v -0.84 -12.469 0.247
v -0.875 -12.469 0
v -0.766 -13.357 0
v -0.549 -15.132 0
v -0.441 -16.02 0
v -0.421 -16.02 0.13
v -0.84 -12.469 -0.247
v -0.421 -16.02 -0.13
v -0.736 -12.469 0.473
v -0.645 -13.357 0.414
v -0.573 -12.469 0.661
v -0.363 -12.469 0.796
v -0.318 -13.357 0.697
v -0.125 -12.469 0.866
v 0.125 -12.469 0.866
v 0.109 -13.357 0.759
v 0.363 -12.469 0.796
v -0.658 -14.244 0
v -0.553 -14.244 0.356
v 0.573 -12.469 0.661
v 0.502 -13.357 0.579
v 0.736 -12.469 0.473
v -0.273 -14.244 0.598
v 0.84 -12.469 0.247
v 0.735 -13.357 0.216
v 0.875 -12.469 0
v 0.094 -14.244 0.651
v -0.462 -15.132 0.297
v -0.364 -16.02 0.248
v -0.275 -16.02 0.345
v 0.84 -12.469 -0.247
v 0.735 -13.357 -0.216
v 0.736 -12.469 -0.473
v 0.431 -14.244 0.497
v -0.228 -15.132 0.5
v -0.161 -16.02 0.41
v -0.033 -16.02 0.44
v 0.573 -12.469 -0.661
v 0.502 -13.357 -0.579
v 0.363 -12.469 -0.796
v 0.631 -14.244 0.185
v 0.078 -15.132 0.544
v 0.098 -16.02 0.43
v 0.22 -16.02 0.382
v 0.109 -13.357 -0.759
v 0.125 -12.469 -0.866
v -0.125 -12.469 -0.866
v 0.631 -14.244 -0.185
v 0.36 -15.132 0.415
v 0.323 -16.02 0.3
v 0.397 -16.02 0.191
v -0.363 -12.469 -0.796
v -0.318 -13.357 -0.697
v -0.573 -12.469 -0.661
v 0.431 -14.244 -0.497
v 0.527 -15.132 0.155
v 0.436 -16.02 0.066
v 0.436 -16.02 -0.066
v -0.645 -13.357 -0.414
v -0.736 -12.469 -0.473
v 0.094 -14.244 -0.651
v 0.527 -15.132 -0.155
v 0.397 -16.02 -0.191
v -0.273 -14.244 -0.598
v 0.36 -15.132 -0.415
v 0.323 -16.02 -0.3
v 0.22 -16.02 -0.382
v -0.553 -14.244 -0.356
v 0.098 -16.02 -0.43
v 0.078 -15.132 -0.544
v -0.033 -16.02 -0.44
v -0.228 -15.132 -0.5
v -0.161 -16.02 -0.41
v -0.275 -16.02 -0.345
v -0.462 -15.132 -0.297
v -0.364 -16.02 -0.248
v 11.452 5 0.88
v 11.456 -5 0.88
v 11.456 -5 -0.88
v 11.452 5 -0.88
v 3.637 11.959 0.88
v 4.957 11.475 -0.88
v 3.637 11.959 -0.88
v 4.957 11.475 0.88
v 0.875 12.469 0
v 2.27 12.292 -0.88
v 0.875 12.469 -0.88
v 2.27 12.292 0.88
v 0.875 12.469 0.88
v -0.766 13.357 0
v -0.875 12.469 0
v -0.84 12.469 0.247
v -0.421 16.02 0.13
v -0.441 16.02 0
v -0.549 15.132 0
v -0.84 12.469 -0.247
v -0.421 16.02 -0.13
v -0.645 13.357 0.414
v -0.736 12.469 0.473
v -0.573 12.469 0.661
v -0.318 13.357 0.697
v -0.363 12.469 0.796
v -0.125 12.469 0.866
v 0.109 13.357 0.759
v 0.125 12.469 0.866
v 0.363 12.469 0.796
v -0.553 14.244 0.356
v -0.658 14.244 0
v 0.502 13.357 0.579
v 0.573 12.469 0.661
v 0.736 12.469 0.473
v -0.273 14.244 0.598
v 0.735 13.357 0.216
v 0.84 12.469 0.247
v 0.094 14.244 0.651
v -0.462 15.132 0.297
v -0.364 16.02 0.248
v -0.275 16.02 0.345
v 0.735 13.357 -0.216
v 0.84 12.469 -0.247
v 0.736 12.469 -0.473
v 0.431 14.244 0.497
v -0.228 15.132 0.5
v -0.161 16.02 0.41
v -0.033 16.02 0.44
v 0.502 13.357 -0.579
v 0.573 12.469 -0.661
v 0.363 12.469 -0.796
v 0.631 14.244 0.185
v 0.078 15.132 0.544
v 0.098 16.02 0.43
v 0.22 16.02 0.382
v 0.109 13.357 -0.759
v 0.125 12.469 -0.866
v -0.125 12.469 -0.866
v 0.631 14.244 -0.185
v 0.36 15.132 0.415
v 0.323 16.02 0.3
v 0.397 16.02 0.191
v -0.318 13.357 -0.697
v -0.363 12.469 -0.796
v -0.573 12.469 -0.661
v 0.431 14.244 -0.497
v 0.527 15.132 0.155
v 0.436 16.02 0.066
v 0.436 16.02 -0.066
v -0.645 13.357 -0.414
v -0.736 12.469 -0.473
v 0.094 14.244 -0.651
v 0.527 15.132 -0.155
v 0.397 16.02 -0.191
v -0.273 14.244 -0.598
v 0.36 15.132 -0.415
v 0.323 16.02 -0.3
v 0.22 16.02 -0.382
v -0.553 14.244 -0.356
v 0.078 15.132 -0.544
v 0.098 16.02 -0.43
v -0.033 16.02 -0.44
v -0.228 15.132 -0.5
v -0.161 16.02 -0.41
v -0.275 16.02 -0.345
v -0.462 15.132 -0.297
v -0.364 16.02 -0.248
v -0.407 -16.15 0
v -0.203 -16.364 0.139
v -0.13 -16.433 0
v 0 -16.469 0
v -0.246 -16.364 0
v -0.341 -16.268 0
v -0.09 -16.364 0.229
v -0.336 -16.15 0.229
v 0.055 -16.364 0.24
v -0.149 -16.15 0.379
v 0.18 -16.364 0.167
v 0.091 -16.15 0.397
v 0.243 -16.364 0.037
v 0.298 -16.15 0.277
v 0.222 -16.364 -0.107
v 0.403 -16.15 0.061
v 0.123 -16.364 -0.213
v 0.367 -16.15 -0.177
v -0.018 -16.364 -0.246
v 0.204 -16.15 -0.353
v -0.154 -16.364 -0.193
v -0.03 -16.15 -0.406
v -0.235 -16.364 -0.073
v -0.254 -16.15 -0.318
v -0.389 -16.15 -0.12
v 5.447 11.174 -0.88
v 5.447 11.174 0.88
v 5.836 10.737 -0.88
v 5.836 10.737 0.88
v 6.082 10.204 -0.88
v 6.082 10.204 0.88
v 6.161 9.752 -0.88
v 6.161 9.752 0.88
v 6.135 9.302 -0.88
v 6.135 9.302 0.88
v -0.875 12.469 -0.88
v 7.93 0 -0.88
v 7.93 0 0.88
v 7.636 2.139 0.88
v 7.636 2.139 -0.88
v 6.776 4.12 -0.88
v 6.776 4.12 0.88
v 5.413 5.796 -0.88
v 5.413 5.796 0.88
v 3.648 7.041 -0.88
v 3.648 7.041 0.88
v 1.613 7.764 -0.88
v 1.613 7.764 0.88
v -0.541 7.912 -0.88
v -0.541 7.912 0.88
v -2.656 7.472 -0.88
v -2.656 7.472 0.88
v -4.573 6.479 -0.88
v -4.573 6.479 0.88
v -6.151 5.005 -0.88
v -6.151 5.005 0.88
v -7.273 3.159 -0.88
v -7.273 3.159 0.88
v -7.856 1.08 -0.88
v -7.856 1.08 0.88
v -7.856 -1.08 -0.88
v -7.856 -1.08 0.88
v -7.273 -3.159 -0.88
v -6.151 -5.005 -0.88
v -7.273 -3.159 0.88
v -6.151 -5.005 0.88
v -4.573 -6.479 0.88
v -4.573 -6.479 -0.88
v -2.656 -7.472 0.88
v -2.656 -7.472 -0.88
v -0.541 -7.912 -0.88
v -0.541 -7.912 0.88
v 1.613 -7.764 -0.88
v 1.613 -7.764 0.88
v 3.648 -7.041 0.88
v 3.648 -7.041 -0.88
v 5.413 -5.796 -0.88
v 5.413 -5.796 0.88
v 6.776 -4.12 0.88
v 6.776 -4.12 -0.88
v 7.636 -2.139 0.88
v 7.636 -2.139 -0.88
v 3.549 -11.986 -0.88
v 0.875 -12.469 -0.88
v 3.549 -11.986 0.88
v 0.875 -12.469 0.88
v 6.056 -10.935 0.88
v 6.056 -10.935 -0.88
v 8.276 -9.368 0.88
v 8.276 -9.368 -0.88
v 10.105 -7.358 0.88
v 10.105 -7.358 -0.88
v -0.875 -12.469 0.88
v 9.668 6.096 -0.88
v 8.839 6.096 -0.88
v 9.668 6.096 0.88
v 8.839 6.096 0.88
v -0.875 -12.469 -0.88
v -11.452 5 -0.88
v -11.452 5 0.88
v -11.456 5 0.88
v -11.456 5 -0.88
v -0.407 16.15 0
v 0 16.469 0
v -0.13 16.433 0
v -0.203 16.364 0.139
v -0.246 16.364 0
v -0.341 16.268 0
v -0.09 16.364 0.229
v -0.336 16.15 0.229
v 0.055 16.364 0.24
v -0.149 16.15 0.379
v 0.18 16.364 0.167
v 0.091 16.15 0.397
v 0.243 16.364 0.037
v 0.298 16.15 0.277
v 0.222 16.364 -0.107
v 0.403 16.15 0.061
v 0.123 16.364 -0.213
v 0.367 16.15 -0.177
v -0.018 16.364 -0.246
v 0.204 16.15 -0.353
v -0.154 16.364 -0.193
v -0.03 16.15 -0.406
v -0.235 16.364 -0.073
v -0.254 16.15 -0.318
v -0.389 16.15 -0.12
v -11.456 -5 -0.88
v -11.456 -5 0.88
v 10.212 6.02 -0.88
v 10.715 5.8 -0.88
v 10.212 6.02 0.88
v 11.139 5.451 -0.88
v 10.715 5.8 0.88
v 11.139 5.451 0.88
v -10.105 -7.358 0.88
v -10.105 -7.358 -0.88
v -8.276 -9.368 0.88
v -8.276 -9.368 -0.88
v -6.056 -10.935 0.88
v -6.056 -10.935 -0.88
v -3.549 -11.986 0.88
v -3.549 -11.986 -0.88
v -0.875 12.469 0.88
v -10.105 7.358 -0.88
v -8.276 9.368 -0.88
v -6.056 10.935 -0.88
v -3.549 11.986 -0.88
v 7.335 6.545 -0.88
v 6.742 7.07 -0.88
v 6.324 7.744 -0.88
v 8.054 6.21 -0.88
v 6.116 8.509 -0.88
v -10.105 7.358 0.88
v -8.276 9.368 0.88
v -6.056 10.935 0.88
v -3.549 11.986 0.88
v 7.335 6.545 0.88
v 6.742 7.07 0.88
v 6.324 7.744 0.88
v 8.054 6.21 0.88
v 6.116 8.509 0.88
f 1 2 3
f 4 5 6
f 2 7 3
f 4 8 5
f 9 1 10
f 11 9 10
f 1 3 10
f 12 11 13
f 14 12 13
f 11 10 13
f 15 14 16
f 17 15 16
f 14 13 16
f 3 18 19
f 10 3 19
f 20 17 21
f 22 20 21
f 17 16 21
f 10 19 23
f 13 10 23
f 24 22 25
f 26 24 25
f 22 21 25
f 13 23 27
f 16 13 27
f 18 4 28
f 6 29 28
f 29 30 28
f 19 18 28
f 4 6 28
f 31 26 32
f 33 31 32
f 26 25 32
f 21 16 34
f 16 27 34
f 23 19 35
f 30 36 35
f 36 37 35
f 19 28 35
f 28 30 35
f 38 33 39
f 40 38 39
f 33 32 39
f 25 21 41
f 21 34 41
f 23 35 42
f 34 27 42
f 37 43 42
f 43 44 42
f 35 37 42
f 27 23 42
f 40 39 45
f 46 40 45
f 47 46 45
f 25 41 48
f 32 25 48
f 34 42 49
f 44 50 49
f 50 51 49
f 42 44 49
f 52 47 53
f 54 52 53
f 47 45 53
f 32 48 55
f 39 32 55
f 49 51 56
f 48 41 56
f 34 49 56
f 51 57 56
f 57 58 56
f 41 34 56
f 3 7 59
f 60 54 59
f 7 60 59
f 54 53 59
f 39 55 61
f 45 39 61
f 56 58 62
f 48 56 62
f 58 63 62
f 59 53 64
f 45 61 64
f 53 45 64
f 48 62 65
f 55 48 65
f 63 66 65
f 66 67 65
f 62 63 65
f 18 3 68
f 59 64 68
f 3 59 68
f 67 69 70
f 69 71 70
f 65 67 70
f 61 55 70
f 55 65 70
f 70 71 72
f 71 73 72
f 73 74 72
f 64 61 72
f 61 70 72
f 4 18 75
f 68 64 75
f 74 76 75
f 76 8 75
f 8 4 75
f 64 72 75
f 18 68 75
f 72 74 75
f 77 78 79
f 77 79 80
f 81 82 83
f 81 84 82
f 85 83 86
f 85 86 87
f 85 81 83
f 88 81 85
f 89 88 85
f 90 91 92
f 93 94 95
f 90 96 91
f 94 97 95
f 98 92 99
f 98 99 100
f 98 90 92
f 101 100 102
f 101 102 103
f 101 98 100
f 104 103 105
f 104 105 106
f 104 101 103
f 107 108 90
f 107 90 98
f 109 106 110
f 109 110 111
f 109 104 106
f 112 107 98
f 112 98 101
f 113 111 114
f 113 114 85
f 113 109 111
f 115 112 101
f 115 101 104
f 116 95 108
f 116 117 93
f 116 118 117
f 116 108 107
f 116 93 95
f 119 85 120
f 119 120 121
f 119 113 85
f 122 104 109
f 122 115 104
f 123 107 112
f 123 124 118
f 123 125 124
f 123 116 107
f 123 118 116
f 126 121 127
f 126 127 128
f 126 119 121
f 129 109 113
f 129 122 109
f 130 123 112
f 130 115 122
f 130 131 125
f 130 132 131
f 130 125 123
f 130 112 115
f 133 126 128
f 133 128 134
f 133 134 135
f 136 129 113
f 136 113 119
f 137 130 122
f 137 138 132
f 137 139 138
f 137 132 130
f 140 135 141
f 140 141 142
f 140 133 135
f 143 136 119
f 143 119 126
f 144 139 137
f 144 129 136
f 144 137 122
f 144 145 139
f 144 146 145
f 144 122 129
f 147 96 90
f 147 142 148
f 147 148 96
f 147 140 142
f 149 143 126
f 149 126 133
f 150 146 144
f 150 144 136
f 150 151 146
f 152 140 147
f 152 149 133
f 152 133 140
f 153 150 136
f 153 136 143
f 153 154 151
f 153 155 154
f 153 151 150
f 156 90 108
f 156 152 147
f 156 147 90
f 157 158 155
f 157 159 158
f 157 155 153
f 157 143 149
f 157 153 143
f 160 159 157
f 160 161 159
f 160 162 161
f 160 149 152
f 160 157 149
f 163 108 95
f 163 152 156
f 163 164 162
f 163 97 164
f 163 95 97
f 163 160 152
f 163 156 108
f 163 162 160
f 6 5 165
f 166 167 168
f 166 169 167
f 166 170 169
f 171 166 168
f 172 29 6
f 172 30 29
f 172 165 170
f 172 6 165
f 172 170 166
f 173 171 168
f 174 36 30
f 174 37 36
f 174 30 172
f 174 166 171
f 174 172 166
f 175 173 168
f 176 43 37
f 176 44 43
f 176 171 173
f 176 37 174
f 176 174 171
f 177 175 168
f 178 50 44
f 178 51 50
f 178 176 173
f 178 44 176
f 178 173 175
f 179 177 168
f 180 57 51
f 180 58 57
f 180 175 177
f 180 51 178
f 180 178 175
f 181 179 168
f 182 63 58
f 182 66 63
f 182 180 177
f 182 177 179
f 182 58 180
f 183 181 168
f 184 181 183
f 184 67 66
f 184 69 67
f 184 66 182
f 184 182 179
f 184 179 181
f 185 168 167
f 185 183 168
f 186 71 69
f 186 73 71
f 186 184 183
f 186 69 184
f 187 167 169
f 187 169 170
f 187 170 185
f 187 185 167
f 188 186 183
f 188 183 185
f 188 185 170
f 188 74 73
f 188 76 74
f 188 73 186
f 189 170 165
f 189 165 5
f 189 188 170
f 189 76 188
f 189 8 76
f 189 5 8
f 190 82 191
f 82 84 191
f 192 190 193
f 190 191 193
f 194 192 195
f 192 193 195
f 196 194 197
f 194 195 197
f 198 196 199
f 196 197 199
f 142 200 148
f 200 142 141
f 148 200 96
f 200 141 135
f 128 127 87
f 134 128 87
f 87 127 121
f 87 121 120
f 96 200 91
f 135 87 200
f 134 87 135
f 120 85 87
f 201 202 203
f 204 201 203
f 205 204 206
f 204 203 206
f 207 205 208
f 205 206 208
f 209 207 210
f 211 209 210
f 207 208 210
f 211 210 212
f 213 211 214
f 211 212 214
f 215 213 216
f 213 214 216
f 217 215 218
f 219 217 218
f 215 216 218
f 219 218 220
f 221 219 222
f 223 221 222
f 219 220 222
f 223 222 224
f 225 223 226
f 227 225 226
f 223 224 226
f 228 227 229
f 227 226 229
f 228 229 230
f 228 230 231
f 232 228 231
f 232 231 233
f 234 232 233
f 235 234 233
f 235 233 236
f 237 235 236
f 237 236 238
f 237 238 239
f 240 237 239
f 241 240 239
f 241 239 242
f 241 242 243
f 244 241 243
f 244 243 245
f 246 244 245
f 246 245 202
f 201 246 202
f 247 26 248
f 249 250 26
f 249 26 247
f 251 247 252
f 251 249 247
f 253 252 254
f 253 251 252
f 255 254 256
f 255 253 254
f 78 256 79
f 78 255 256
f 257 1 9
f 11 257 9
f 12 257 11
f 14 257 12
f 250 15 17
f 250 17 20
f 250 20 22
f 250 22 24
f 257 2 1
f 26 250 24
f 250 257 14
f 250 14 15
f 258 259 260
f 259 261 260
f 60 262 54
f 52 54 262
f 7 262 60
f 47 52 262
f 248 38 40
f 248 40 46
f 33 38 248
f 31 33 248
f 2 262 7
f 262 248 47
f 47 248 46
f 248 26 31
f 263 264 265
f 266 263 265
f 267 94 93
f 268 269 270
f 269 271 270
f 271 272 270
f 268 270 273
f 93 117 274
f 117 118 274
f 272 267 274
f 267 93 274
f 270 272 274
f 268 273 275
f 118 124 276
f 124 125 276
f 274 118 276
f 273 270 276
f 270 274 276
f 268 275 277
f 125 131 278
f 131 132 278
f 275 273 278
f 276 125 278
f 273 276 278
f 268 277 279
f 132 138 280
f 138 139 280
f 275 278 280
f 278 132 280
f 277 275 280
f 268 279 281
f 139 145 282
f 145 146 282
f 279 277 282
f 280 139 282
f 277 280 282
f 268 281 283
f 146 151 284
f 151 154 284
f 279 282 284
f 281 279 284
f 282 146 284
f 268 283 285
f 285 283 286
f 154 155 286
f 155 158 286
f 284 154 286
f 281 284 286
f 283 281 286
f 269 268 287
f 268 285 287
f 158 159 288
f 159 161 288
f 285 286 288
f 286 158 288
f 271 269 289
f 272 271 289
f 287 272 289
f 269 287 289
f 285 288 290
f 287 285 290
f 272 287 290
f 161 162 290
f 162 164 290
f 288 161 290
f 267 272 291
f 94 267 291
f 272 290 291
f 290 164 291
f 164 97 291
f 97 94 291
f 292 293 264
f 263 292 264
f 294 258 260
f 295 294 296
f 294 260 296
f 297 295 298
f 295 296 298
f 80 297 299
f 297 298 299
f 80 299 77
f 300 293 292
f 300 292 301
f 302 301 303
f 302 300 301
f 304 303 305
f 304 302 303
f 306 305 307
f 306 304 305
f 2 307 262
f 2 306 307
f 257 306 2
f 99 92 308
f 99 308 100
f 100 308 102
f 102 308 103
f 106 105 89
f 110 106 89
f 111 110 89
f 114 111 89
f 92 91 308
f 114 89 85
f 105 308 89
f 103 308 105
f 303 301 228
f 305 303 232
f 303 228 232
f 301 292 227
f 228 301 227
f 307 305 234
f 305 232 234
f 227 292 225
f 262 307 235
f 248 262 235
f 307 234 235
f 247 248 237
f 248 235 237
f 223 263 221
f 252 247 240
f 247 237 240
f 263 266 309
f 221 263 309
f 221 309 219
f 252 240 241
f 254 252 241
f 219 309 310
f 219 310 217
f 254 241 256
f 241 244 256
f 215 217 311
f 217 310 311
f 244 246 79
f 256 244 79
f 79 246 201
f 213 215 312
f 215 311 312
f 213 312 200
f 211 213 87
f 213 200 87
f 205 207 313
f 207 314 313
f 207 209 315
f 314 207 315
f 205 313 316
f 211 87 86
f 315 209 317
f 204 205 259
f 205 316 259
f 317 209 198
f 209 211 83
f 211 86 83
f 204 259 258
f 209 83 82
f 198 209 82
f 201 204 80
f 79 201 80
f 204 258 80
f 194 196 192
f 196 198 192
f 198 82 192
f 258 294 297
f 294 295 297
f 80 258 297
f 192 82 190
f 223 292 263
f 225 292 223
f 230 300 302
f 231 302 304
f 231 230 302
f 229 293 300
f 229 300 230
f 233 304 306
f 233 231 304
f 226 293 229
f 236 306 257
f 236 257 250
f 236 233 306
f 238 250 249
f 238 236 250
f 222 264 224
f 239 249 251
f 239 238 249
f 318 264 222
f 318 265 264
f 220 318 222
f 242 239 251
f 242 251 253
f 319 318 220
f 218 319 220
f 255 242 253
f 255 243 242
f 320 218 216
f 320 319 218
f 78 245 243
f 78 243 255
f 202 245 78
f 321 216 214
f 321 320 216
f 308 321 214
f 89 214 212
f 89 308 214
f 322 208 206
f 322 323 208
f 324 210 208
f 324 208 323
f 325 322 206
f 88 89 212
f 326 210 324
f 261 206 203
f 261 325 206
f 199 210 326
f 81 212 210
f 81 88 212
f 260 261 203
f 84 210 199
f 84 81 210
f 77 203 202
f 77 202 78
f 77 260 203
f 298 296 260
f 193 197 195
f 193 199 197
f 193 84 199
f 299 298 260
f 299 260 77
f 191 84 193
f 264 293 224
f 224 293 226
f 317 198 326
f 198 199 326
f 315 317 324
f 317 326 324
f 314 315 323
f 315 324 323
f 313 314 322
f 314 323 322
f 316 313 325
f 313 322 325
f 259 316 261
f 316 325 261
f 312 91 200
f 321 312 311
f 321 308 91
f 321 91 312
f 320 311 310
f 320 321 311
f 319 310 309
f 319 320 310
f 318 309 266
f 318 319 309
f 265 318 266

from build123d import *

# Parameters (mm, degrees)
PAD_DEPTH       = 0.88
PAD_DEPTH_BACK  = 0.88
FILLET_R        = 2
SKETCH002_R     = 7.93
POCKET_DEPTH    = 5
POCKET001_DEPTH = 5


with BuildPart() as part:
    # Sketch → Pad (new body, two sides)
    with BuildSketch(Plane.XY) as pad_sk:
        with BuildLine():
            ThreePointArc((-0.875, 12.469337), (-12.5, 0), (-0.875, -12.469337))
            Line((-0.875, -12.469337), (-0.875, -16.469337))
            Line((-0.875, -16.469337), (0.875, -16.469337))
            Line((0.875, -12.469337), (0.875, -16.469337))
            ThreePointArc((0.875, -12.469337), (10.995688, -5.945153), (10.912848, 6.095879))
            Line((8.838835, 6.095879), (10.912848, 6.095879))
            ThreePointArc((6.698177, 10.553882), (6.366174, 7.651504), (8.838835, 6.095879))
            ThreePointArc((6.698177, 10.553882), (3.905828, 11.874111), (0.875, 12.469337))
            Line((0.875, 12.469337), (0.875, 16.469337))
            Line((-0.875, 16.469337), (0.875, 16.469337))
            Line((-0.875, 12.469337), (-0.875, 16.469337))
        make_face()
    extrude(amount=PAD_DEPTH)
    extrude(pad_sk.sketch, amount=-PAD_DEPTH_BACK)

    # Fillet
    fillet_edges = [part.edges().sort_by_distance(p)[0] for p in [
        (6.698177, 10.553882, 0),
        (10.912848, 6.095879, 0),
    ]]
    fillet(fillet_edges, radius=FILLET_R)

    # Sketch001 → Groove (revolve, cut)
    with BuildSketch(Plane.XY):
        with BuildLine():
            Line((-0.875, 12.469337), (-1.427669, 12.469337))
            Line((-1.427669, 12.469337), (-1.427669, 16.923711))
            Line((-1.427669, 16.923711), (0, 16.923711))
            Line((0, 16.923711), (0, 16.469337))
            ThreePointArc((0, 16.469337), (-0.296631, 16.319125), (-0.4408, 16.01951))
            Line((-0.875, 12.469337), (-0.4408, 16.01951))
        make_face()
    groove = revolve(axis=Axis((0, 0, 0), (0, 1, 0)), mode=Mode.SUBTRACT)

    # Mirrored: Groove across XZ
    add(groove.mirror(Plane.XZ), mode=Mode.SUBTRACT)

    # Sketch002 (on Face6 of Mirrored) → Pocket (cut)
    with BuildSketch(Plane.XY.offset(0.88)):
        Circle(SKETCH002_R)
    extrude(amount=-POCKET_DEPTH, mode=Mode.SUBTRACT)

    # Sketch003 (on Face6 of Pocket) → Pocket001 (cut)
    with BuildSketch(Plane.XY.offset(0.88)):
        Polygon((12.882158, 5), (12.882158, -5), (11.456439, -5), (11.452158, 5), align=None)
    pocket001 = extrude(amount=-POCKET001_DEPTH, mode=Mode.SUBTRACT)

    # Mirrored001: Pocket001 across Sketch003 V_Axis
    add(pocket001.mirror(Plane(origin=(0, 0, 0.88), x_dir=(0, 0, 1), z_dir=(1, 0, 0))), mode=Mode.SUBTRACT)


solid = part.part
